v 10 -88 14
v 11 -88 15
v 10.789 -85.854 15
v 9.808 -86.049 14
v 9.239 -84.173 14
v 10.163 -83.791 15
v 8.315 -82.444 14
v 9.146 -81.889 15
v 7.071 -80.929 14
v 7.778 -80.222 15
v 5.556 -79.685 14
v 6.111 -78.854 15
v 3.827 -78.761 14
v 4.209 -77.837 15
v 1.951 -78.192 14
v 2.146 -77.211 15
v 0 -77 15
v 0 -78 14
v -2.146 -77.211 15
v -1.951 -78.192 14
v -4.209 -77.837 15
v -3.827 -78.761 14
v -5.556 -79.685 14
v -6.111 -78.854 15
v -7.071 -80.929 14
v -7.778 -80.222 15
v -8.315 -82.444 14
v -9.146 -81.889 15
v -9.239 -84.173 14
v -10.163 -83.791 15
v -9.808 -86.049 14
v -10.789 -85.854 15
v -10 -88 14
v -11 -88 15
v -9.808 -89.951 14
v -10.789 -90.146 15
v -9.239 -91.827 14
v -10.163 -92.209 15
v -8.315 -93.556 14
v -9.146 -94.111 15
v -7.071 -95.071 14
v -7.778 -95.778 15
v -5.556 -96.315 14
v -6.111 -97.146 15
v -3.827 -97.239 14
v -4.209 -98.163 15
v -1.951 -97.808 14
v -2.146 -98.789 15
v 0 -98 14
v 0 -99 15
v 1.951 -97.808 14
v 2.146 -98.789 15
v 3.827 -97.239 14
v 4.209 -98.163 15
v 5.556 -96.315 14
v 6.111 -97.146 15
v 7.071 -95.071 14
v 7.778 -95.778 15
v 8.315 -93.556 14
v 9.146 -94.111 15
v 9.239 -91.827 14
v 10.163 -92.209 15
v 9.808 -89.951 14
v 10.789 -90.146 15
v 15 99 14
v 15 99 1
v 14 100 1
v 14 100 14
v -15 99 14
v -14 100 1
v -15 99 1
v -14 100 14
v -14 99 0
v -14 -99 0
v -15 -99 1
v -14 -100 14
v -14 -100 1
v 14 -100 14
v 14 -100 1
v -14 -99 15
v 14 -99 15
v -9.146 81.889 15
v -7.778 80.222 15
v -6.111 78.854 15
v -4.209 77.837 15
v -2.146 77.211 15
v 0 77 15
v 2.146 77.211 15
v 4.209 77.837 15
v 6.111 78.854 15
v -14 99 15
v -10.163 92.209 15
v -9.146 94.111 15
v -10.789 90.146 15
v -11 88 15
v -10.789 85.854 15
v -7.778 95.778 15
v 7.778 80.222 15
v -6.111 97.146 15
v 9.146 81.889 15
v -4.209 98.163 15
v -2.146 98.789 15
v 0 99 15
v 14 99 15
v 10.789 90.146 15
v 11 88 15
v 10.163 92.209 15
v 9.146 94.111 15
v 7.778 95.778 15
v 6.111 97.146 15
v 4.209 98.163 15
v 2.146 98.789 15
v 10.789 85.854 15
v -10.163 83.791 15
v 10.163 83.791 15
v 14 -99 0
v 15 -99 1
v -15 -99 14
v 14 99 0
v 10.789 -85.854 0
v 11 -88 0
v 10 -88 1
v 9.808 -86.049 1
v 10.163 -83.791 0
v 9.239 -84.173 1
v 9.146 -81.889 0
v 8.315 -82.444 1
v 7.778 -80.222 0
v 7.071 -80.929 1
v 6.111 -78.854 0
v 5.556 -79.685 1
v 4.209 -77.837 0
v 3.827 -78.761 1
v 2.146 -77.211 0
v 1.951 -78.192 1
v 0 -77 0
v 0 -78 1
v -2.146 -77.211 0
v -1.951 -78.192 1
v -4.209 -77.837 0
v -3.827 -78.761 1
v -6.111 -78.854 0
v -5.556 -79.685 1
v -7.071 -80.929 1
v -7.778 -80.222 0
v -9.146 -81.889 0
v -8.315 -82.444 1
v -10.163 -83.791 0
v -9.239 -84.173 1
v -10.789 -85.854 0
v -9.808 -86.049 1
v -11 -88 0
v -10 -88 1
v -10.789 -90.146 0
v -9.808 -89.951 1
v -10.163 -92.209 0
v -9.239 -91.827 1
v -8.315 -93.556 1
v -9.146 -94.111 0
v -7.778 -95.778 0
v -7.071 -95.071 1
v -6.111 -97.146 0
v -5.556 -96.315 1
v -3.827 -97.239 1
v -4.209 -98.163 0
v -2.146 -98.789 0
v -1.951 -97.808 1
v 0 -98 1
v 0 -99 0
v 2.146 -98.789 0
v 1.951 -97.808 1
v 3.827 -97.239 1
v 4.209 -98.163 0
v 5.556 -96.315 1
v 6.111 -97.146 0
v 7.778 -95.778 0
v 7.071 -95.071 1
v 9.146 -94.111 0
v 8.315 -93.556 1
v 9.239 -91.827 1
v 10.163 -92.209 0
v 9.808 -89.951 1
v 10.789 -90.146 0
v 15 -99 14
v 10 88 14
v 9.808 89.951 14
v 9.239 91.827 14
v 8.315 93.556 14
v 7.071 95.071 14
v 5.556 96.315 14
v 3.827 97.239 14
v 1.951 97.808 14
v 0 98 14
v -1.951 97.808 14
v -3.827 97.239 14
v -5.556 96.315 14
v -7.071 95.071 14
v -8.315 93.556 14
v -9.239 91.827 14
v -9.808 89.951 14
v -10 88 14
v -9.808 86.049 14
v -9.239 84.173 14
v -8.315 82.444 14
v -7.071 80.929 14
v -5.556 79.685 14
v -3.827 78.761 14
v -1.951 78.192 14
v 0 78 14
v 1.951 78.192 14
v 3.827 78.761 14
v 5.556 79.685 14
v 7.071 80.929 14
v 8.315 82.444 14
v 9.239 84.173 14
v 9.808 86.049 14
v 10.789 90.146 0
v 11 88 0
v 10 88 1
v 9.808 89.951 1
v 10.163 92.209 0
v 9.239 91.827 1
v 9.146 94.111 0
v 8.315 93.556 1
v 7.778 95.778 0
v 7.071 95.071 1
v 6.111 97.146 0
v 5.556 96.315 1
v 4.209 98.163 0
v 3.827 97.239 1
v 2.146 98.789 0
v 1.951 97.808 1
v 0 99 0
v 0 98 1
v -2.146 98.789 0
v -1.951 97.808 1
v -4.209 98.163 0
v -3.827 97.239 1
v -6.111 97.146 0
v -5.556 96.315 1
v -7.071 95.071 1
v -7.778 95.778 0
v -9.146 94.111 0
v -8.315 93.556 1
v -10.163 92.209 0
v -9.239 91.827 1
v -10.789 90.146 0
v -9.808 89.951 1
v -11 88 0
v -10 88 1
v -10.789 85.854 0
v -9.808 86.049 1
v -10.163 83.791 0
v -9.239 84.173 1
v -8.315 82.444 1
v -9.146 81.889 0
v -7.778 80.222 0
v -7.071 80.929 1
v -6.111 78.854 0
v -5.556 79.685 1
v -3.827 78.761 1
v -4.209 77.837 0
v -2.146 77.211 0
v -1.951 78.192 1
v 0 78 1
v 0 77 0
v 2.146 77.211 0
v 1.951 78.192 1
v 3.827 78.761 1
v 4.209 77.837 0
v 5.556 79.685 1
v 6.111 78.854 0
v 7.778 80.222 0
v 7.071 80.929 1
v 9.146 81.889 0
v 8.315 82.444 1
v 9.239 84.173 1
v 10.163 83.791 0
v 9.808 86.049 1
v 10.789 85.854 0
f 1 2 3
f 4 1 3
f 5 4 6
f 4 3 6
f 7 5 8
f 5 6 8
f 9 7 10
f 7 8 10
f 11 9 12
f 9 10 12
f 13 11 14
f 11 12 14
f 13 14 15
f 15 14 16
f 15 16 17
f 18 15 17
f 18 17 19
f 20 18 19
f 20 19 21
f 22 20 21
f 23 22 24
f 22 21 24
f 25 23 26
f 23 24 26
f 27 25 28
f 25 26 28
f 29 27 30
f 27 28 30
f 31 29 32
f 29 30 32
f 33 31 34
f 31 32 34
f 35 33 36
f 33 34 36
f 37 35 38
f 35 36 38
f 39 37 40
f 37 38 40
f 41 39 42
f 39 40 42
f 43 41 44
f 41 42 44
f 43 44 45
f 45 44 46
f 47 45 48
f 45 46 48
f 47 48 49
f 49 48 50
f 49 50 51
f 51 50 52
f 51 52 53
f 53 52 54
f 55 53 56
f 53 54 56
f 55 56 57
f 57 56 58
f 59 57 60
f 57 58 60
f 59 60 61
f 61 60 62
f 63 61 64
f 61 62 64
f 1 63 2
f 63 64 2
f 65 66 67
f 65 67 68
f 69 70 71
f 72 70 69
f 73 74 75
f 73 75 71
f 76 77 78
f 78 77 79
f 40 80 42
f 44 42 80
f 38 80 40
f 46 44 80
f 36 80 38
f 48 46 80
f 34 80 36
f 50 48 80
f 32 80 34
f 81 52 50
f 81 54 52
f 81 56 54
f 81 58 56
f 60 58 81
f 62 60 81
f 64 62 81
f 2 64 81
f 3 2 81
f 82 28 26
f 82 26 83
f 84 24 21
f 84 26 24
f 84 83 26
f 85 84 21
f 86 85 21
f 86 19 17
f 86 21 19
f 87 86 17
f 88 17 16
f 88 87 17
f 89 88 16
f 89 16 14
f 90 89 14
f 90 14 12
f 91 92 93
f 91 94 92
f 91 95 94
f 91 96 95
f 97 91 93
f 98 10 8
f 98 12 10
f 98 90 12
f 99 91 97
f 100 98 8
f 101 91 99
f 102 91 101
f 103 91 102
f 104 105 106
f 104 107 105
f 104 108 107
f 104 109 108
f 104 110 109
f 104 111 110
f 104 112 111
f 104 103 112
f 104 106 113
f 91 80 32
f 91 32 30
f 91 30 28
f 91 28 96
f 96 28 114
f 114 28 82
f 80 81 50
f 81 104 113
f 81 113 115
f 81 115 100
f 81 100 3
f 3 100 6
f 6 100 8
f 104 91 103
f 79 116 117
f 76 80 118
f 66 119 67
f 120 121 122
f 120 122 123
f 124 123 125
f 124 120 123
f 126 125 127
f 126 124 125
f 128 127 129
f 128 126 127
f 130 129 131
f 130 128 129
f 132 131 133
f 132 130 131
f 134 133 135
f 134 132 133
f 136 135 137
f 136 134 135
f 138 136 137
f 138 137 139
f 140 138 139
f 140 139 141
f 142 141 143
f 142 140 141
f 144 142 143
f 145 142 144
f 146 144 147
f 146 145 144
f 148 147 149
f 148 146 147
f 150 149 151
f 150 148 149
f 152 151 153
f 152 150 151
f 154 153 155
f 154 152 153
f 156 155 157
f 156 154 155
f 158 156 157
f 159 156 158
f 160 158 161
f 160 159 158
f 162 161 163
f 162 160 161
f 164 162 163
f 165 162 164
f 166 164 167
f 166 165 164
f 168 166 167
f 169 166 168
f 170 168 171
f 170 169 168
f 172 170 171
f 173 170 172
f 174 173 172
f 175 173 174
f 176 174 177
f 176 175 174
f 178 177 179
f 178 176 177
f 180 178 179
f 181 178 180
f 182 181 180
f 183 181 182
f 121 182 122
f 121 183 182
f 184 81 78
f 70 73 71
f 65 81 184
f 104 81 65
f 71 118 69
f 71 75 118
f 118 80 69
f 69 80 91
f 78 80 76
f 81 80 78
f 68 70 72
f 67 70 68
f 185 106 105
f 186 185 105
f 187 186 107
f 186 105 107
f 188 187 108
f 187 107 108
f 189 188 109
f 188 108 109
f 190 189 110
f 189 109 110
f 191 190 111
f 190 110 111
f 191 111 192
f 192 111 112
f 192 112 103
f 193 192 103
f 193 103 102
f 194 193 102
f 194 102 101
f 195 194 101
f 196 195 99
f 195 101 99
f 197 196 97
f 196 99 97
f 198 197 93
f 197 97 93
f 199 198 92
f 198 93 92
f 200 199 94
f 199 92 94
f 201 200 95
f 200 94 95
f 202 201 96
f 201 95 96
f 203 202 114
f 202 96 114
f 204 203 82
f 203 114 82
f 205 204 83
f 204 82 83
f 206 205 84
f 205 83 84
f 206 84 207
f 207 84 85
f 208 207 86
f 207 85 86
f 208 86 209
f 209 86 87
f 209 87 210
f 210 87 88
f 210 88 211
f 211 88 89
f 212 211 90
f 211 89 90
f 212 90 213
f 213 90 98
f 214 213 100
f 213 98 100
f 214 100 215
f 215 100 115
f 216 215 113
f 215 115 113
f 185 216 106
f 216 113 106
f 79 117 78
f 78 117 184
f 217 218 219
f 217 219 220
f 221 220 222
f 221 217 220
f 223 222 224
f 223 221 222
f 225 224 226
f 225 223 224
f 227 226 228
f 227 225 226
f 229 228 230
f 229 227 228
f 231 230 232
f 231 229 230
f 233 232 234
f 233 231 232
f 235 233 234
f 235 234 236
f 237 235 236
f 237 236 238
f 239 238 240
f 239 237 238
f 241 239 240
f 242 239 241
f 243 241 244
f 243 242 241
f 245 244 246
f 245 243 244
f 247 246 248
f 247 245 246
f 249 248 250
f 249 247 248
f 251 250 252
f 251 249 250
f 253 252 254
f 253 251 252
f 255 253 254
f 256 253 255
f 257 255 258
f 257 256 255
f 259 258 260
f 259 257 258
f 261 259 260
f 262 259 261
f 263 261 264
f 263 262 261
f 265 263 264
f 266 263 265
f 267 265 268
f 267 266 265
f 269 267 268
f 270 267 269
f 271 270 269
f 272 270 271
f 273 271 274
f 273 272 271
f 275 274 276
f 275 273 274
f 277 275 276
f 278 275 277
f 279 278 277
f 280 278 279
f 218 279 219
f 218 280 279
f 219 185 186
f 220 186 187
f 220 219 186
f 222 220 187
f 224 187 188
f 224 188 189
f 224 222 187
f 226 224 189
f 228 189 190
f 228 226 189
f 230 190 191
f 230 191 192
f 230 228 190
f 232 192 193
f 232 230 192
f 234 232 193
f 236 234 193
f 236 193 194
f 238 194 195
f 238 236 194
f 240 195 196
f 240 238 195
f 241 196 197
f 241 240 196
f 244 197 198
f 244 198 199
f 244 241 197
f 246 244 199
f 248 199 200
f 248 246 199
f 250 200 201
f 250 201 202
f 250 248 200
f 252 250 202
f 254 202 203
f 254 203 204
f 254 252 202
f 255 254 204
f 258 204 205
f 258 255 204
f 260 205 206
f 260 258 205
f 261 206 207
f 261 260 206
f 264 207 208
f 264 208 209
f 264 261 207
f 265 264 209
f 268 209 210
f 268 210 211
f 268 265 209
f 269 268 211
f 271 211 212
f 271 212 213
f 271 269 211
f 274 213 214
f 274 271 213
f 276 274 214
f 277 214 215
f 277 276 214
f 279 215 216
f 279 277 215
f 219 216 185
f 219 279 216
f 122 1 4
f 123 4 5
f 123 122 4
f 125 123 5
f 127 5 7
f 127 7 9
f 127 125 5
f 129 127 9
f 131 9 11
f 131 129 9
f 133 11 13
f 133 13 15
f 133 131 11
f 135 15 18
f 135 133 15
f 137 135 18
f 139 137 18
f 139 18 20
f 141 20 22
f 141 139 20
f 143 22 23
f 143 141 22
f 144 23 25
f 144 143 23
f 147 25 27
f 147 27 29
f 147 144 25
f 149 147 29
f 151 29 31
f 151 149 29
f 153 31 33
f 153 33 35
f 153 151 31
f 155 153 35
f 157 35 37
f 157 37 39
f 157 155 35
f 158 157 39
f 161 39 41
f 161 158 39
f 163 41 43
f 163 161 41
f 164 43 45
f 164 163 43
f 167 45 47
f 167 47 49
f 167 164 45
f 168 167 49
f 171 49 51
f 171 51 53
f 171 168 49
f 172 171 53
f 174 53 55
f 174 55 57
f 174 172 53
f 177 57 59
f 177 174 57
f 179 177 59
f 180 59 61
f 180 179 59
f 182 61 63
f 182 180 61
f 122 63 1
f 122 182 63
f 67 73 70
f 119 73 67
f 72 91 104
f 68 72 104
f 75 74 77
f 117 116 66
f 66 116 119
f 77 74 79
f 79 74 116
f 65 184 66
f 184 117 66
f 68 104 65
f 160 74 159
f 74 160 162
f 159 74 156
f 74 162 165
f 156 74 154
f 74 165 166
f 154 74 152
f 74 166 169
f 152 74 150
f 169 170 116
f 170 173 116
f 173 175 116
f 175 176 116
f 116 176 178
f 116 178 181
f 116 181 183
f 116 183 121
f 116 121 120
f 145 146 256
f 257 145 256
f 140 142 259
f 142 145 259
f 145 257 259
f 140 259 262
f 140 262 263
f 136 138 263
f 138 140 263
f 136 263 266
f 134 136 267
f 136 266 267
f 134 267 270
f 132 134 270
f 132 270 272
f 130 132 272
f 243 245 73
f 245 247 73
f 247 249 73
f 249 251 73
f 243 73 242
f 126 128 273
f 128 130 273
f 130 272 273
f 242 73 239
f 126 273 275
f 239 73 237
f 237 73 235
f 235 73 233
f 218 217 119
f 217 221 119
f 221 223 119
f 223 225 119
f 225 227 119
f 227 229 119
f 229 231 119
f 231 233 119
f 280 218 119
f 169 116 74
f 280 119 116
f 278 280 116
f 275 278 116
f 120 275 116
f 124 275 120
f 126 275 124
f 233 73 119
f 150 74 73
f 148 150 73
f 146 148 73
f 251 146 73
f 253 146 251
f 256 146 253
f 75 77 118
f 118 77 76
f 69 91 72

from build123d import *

# Parameters (mm, degrees)
SKETCH1_W           = 30
SKETCH1_H           = 200
SKETCH1_R           = 10
BOSS_EXTRUDE1_DEPTH = 15
CHAMFER1_SIZE       = 1


with BuildPart() as part:
    # Sketch1 → Boss-Extrude1 (new body)
    with BuildSketch(Plane.XY):
        Rectangle(SKETCH1_W, SKETCH1_H)
        with Locations((0, 88)):
            Circle(SKETCH1_R, mode=Mode.SUBTRACT)
        with Locations((0, -88)):
            Circle(SKETCH1_R, mode=Mode.SUBTRACT)
    extrude(amount=BOSS_EXTRUDE1_DEPTH)

    # Chamfer1
    chamfer1_edges = [part.edges().sort_by_distance(p)[0] for p in [
        (-15, 0, 15),
        (-10, 88, 0),
        (-10, 88, 15),
        (0, -100, 15),
        (-10, -88, 0),
        (-10, -88, 15),
        (15, 0, 15),
        (0, -100, 0),
        (-15, 0, 0),
        (0, 100, 0),
        (15, 0, 0),
        (0, 100, 15),
        (15, -100, 7.5),
        (-15, -100, 7.5),
        (-15, 100, 7.5),
        (15, 100, 7.5),
    ]]
    chamfer(chamfer1_edges, length=CHAMFER1_SIZE - 0.0001)  # a hair under: the kernel refuses the full size


solid = part.part
